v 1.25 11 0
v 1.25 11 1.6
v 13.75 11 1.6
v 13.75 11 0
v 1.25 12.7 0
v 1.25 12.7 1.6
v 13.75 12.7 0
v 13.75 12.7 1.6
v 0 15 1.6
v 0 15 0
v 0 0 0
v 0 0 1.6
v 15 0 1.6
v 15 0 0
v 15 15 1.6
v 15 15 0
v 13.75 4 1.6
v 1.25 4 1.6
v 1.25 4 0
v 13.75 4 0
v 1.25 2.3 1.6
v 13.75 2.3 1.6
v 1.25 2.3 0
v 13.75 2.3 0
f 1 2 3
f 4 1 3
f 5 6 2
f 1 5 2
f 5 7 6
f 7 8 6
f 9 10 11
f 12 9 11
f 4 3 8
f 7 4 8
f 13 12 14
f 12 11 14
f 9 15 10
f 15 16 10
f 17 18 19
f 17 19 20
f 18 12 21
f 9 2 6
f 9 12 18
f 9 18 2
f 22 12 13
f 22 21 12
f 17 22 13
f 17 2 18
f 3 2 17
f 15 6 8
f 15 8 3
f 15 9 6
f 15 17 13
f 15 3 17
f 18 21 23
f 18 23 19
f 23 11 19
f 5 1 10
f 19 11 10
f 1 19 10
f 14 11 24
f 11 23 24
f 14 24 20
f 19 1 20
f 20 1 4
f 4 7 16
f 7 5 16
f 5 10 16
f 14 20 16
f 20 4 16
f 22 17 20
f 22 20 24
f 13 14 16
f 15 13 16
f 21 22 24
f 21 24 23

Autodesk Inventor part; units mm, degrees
ref_plane "YZ Plane" through (0, 0, 0) normal (1, 0, 0) x (0, 1, 0)
ref_plane "XZ Plane" through (0, 0, 0) normal (0, 1, 0) x (-1, 0, 0)
ref_plane "XY Plane" through (0, 0, 0) normal (0, 0, 1) x (1, 0, 0)
sketch "スケッチ1" plane through (0, 0, 0) normal (0, 0, 1) x (1, 0, 0)
  line L0 (0, 0) -> (15, 0)
  line L1 (15, 0) -> (15, 15)
  line L2 (15, 15) -> (0, 15)
  line L3 (0, 15) -> (0, 0)
  dimension "d0" = 15
  dimension "d1" = 15
extrude "押し出し1" add sketch "スケッチ1" along normal blind 1.6
sketch "スケッチ2" plane through (0, 0, 1.6) normal (0, 0, 1) x (1, 0, 0)
  line L0 (1.25, 4) -> (13.75, 4)
  line L1 (13.75, 4) -> (13.75, 2.3)
  line L2 (13.75, 2.3) -> (1.25, 2.3)
  line L3 (1.25, 2.3) -> (1.25, 4)
  line L4 (0, 0) -> (15, 0) projected
  line L5 (15, 0) -> (15, 15) projected
  line L6 (15, 15) -> (0, 15) projected
  line L7 (0, 15) -> (0, 0) projected
  line L8 (0, 0) -> (15, 0) projected
  line L9 (0, 15) -> (0, 0) projected
  line L10 (0, 7.5) -> (2.3188, 7.5)
  line L11 (1.25, 11) -> (13.75, 11)
  line L12 (13.75, 11) -> (13.75, 12.7)
  line L13 (13.75, 12.7) -> (1.25, 12.7)
  line L14 (1.25, 12.7) -> (1.25, 11)
  line L15 (7.5, 2.3) -> (7.5, 0)
  point P0 (7.5, 13.5879)
  dimension "d4" = 12.5
  dimension "d5" = 1.7
  dimension "d6" = 7
extrude "押し出し2" cut sketch "スケッチ2" against normal through all contours L0 L1 L2 L3 | L14 L13 L12 L11
properties part number "USBブリッジ基板1"
